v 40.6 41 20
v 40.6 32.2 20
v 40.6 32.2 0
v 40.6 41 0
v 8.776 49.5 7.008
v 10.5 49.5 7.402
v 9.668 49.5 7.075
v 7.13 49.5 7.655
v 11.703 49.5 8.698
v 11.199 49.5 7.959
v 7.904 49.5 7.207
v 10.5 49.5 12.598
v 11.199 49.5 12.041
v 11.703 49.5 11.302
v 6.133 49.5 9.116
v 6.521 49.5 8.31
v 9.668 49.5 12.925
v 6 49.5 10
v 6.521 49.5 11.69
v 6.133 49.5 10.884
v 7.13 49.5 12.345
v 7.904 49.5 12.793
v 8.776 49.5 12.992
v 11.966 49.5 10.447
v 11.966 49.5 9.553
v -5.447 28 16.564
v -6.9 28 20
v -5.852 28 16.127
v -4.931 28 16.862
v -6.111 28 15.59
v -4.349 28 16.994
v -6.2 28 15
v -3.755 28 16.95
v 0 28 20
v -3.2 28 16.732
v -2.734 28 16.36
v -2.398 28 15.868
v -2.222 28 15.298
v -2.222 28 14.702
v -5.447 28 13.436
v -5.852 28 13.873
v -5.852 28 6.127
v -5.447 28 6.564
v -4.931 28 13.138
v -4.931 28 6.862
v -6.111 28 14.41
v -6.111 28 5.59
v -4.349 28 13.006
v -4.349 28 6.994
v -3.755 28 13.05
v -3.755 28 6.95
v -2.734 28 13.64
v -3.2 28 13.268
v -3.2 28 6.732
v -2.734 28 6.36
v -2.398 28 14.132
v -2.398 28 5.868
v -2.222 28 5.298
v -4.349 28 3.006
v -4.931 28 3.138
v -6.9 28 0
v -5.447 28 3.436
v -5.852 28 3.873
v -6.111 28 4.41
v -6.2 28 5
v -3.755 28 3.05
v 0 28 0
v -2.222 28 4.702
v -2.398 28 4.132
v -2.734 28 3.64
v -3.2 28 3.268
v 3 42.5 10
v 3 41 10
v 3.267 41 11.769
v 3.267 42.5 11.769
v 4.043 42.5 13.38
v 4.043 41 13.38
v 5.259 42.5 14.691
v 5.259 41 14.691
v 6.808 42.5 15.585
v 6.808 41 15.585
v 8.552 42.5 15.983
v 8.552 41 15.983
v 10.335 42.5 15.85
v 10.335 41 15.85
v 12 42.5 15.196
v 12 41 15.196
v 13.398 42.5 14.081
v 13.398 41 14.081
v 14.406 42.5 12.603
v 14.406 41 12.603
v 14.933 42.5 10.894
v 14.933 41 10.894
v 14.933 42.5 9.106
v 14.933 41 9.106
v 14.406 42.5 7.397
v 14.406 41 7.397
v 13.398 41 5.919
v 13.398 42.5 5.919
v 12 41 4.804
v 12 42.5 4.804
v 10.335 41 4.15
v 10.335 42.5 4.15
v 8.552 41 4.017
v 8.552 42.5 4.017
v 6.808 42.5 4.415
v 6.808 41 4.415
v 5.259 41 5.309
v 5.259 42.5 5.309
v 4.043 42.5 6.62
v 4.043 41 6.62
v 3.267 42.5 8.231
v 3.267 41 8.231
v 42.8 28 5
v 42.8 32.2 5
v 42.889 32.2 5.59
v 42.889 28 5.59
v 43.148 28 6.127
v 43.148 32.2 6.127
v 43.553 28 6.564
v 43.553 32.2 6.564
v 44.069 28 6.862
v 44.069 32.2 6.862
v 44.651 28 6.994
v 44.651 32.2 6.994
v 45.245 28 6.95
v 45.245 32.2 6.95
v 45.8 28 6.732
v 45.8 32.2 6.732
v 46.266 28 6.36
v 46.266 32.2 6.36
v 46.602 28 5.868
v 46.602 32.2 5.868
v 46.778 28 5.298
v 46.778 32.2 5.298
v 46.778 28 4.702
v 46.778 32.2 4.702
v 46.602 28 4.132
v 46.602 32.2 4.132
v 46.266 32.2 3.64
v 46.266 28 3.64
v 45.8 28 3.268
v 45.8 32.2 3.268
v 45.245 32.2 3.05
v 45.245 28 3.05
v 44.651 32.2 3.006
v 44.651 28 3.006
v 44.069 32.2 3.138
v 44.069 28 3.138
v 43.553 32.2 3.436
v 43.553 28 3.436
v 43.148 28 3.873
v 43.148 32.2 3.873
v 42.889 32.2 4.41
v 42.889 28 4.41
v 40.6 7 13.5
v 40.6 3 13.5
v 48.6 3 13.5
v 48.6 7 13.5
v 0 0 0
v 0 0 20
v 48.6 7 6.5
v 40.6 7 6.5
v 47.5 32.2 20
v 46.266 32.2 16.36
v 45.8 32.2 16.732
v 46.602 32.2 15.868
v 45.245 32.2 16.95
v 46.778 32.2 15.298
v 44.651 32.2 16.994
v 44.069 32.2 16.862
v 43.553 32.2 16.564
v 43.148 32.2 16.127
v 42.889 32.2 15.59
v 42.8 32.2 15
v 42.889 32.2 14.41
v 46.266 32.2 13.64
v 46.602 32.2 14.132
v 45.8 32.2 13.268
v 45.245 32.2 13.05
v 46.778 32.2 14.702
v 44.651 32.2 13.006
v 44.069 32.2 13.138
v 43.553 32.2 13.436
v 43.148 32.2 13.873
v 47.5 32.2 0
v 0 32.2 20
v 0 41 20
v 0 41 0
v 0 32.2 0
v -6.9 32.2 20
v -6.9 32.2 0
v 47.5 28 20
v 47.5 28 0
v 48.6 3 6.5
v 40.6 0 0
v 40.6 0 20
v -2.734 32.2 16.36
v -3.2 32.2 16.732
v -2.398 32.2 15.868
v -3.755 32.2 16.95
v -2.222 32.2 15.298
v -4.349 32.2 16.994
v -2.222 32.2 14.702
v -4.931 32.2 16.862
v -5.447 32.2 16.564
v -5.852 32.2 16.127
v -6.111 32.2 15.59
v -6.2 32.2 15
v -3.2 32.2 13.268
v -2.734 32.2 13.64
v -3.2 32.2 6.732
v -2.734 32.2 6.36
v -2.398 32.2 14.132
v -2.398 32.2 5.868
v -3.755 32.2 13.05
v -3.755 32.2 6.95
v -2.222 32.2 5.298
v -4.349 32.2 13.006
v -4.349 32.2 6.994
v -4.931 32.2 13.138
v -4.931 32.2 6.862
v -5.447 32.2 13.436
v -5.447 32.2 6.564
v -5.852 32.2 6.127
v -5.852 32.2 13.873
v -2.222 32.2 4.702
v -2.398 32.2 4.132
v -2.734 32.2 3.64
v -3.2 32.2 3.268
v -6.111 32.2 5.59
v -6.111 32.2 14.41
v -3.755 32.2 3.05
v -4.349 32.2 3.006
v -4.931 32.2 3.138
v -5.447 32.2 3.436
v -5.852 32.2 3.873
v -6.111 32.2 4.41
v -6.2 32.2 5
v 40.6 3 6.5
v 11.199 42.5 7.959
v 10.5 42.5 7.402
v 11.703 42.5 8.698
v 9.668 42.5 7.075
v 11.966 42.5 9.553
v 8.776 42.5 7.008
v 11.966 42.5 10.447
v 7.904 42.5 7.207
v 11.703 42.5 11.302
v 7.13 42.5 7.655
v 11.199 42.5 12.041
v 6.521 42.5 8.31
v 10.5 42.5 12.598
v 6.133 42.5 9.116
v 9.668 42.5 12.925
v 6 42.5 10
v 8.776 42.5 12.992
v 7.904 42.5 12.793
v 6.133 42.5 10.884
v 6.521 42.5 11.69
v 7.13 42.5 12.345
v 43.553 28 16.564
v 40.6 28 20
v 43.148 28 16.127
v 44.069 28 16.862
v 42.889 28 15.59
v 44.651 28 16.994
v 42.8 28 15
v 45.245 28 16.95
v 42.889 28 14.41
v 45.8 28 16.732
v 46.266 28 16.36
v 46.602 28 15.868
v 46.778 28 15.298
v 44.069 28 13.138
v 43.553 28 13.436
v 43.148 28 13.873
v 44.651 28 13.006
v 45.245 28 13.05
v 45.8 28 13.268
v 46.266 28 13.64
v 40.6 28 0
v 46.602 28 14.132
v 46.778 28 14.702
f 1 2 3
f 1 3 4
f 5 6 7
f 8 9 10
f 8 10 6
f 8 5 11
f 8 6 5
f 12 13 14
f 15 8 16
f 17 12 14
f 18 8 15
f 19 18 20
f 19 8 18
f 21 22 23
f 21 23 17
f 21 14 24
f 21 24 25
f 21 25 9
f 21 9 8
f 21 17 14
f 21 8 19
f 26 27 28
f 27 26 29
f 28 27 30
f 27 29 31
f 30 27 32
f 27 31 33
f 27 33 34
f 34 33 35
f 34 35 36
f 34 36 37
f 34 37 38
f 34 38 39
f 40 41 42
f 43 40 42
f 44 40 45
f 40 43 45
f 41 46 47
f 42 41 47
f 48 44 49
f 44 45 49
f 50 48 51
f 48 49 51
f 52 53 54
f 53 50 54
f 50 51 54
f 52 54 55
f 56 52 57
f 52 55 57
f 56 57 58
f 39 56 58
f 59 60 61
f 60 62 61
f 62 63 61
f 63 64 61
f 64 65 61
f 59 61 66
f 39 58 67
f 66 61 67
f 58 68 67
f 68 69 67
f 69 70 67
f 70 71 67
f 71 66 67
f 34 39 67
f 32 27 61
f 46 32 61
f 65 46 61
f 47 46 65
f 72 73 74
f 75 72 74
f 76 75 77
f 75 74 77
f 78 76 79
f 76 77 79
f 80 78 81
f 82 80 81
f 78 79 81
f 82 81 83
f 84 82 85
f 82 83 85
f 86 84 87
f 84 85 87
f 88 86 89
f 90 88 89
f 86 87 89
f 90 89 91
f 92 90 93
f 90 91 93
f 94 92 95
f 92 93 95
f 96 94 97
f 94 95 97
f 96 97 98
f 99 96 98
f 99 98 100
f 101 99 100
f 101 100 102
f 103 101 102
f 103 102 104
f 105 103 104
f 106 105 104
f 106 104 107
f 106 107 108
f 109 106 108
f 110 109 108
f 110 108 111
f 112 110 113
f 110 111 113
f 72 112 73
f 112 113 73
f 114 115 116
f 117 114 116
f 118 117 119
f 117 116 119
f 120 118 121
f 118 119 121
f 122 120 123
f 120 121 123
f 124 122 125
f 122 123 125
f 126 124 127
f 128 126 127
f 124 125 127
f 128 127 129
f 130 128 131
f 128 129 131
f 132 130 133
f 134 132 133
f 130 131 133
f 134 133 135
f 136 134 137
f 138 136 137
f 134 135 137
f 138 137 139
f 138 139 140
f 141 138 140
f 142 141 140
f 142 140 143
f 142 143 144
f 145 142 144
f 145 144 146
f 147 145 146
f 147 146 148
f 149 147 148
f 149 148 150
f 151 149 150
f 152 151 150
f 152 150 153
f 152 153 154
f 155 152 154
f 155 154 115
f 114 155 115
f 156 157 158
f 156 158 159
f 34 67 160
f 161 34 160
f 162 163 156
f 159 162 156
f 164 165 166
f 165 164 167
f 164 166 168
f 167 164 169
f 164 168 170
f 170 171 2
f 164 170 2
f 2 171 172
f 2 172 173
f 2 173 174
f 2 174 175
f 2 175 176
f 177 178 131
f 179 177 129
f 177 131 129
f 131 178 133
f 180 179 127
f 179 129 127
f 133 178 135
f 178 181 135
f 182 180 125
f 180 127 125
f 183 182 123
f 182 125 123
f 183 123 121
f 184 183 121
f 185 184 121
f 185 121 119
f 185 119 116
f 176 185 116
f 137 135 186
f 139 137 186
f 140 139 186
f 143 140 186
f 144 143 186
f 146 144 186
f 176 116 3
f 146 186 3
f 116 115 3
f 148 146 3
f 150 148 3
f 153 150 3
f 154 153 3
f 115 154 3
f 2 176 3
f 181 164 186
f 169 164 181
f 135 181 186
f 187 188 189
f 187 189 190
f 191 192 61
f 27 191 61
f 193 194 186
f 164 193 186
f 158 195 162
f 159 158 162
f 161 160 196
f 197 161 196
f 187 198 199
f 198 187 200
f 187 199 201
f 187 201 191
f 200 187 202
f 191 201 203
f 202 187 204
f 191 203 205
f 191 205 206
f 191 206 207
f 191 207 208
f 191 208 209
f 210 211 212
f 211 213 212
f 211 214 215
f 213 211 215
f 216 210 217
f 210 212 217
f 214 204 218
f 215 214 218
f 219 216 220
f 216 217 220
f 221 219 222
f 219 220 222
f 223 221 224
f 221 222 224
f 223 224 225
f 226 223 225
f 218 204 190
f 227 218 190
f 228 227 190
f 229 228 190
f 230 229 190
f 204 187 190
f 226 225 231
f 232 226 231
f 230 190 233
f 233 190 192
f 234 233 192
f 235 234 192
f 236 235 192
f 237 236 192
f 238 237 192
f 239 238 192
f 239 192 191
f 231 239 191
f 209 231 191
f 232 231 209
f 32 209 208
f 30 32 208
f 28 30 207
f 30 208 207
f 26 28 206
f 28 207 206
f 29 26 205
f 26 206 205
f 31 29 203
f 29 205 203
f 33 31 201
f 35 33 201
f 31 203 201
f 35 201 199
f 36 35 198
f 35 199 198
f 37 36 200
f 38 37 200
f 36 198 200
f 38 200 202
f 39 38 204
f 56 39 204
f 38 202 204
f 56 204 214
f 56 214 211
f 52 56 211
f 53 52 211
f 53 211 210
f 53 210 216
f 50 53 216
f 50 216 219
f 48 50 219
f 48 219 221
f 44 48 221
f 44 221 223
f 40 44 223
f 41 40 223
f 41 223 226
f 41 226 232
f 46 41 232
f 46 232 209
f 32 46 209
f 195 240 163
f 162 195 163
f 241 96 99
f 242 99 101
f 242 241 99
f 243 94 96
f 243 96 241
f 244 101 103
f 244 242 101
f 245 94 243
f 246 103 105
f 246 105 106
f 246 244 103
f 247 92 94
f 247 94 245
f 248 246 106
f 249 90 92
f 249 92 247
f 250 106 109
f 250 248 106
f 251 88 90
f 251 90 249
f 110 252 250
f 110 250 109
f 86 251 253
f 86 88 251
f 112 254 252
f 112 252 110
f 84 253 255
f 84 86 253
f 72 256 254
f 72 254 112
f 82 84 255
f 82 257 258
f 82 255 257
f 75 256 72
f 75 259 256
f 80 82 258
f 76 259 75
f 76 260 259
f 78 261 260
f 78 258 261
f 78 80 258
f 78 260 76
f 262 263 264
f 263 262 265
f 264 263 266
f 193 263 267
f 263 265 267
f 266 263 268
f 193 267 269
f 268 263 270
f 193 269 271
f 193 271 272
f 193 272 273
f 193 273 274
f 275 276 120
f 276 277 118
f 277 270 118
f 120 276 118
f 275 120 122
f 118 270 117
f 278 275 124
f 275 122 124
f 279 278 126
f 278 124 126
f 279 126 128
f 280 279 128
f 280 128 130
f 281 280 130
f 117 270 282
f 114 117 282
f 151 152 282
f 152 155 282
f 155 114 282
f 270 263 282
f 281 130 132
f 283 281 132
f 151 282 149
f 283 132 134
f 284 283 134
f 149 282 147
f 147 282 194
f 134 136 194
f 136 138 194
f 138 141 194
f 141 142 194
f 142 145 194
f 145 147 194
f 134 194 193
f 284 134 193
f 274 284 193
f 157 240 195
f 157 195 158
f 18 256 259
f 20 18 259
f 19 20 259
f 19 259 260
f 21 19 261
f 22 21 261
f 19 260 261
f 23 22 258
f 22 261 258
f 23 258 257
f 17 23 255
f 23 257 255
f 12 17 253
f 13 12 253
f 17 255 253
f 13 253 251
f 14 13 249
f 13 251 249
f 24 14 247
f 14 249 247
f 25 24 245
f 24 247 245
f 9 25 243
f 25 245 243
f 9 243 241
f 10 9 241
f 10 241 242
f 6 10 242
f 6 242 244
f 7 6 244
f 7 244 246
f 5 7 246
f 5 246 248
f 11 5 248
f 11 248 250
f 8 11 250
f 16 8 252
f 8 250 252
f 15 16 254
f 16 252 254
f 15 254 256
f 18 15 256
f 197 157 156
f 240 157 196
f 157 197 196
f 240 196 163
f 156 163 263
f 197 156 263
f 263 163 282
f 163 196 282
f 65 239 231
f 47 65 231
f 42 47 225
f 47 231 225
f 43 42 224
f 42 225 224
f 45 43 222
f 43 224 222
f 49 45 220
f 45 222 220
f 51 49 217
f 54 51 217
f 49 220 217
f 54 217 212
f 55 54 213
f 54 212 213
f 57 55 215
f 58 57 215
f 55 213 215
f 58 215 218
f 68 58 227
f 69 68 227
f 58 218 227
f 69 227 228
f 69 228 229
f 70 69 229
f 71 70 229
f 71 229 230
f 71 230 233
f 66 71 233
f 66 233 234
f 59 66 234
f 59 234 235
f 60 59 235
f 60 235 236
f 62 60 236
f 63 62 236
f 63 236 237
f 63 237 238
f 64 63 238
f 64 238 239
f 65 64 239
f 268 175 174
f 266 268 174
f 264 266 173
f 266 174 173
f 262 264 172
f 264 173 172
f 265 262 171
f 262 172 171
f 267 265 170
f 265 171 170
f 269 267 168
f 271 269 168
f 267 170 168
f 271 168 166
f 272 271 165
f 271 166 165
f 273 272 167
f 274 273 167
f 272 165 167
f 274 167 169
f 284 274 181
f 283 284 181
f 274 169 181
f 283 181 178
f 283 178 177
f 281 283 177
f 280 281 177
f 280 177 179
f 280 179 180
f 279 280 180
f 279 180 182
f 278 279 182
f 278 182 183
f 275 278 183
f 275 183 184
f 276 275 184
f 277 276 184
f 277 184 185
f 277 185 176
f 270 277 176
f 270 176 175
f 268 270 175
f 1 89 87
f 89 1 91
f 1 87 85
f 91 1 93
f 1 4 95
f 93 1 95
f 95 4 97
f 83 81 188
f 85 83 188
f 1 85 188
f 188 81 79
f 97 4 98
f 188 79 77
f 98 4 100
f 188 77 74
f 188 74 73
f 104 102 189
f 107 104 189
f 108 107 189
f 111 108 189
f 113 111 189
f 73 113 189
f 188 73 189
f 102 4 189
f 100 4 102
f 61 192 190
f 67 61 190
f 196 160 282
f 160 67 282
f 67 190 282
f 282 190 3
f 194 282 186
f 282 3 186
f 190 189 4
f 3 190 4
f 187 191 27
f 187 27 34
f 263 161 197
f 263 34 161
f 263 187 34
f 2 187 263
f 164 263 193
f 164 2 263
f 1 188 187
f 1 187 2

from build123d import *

# Parameters (mm, degrees)
PAD_DEPTH    = 20
SKETCH001_R  = 6
PAD001_DEPTH = 1.5
SKETCH002_R  = 3
PAD002_DEPTH = 7
SKETCH003_R  = 2
POCKET_DEPTH = 32.201
SKETCH004_W  = 4
SKETCH004_H  = 7
PAD003_DEPTH = 8


with BuildPart() as part:
    # Sketch → Pad (new body)
    with BuildSketch(Plane.XY):
        Polygon((0, 0), (40.6, 0), (40.6, 28), (47.5, 28), (47.5, 32.2), (40.6, 32.2), (40.6, 41), (0, 41), (0, 32.2), (-6.9, 32.2), (-6.9, 28), (0, 28), align=None)
    extrude(amount=PAD_DEPTH)

    # Sketch001 (on Face8 of Pad) → Pad001 (join)
    with BuildSketch(Plane(origin=(0, 41, 0), x_dir=(-1, 0, 0), z_dir=(0, 1, 0))):
        with Locations((-9, 10)):
            Circle(SKETCH001_R)
    extrude(amount=PAD001_DEPTH)

    # Sketch002 (on Face16 of Pad001) → Pad002 (join)
    with BuildSketch(Plane(origin=(0, 42.5, 0), x_dir=(-1, 0, 0), z_dir=(0, 1, 0))):
        with Locations((-9, 10)):
            Circle(SKETCH002_R)
    extrude(amount=PAD002_DEPTH)

    # Sketch003 (on Face10 of Pad002) → Pocket (cut, through all)
    with BuildSketch(Plane(origin=(0, 32.2, 0), x_dir=(-1, 0, 0), z_dir=(0, 1, 0))):
        with Locations((4.2, 15)):
            Circle(SKETCH003_R)
        with Locations((4.2, 5)):
            Circle(SKETCH003_R)
        with Locations((-44.8, 5)):
            Circle(SKETCH003_R)
        with Locations((-44.8, 15)):
            Circle(SKETCH003_R)
    extrude(amount=-POCKET_DEPTH, mode=Mode.SUBTRACT)

    # Sketch004 (on Face9 of Pocket) → Pad003 (join)
    with BuildSketch(Plane.YZ.offset(40.6)):
        with Locations((5, 10)):
            Rectangle(SKETCH004_W, SKETCH004_H)
    extrude(amount=PAD003_DEPTH)


solid = part.part
